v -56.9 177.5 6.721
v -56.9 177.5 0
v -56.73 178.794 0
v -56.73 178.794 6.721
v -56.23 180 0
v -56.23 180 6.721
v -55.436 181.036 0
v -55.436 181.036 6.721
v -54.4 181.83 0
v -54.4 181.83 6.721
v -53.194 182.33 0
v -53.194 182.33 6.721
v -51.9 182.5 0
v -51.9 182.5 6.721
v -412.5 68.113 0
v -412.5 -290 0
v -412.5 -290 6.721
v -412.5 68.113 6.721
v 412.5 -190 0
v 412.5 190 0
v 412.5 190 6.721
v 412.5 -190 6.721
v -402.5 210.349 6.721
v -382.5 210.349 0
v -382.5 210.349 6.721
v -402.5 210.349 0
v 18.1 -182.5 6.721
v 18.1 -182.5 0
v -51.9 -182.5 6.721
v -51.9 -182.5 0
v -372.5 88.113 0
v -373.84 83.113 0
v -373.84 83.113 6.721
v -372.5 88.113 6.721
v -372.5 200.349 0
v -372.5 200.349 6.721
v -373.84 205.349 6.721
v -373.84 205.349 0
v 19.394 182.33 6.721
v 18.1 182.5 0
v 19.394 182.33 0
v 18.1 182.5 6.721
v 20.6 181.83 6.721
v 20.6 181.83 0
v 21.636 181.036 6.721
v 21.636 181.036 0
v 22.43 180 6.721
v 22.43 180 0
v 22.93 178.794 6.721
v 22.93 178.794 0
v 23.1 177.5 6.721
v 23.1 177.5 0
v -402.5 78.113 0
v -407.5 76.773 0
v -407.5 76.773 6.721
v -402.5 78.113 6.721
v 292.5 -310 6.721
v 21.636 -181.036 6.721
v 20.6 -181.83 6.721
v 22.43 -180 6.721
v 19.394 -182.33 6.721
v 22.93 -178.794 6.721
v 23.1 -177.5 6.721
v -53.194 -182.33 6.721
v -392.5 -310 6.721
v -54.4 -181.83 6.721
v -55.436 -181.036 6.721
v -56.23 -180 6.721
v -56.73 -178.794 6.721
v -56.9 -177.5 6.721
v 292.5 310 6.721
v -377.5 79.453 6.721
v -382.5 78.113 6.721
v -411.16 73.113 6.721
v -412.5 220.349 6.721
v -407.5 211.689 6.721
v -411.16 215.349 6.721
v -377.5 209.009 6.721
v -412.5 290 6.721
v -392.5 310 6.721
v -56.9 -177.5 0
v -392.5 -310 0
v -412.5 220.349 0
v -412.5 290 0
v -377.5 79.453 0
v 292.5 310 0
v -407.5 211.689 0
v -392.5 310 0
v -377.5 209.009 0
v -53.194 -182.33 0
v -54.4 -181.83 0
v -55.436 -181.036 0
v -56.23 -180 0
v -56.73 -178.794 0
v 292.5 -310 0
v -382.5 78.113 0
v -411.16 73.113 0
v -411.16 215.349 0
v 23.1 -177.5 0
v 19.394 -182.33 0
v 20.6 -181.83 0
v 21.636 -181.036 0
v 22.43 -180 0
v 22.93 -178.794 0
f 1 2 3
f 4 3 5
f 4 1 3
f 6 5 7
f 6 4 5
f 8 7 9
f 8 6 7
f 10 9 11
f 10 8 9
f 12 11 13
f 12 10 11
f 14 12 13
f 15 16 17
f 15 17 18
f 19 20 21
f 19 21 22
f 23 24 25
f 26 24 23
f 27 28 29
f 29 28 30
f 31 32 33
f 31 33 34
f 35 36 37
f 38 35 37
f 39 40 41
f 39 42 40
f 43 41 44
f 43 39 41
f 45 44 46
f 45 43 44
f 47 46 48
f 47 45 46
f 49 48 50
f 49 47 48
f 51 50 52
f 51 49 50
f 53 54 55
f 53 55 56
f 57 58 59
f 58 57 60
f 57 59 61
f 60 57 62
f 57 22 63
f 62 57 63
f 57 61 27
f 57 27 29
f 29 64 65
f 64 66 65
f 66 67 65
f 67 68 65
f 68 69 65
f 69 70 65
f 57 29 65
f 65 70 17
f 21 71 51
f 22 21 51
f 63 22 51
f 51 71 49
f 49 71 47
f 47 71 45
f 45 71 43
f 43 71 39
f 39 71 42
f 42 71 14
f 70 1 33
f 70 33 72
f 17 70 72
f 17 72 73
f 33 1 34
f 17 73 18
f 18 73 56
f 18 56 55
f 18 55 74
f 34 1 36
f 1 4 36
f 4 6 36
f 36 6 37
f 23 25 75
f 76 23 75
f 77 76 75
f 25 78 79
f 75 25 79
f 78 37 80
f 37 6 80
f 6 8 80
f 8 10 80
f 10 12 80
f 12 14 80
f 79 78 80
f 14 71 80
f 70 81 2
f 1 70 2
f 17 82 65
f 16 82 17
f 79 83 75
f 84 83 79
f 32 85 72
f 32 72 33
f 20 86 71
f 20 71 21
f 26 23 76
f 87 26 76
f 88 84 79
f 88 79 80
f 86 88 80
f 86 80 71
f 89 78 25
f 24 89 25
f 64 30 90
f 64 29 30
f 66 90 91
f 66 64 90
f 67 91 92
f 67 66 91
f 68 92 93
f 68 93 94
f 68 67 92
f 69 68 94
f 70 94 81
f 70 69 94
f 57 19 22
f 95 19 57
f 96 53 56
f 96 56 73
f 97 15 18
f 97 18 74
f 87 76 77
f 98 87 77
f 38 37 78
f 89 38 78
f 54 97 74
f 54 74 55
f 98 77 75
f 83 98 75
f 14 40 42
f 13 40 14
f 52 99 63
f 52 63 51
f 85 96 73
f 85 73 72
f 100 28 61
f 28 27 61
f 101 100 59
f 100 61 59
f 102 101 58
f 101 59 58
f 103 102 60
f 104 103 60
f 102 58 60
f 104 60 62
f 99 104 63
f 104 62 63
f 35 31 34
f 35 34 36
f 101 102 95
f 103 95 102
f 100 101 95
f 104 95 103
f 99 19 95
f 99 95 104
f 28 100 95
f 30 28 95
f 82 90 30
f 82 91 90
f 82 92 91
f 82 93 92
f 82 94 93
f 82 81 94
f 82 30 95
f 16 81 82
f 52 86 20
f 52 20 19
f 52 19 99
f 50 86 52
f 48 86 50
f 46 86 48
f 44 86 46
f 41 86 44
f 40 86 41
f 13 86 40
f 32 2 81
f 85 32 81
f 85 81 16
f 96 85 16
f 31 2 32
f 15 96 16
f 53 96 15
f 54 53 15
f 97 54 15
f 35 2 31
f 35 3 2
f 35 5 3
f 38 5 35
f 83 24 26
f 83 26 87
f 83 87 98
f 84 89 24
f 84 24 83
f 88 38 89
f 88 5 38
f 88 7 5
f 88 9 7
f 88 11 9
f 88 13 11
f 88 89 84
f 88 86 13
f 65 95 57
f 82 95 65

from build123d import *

# Parameters (mm, degrees)
BOSS_EXTRUDE1_DEPTH = 6.720839839
SKETCH2_W           = 80
SKETCH2_H           = 365
CUT_EXTRUDE1_DEPTH  = 517.04400614
FILLET1_R           = 5


with BuildPart() as part:
    # Sketch1 → Boss-Extrude1 (new body)
    with BuildSketch(Plane(origin=(0, 0, 0), x_dir=(-1.0, 0, 1.2419204428734467e-09), z_dir=(-1.2419204428734467e-09, 1.2419185922687681e-09, -1.0))):
        Polygon((372.500002384, 200.349256396), (373.839735985, 205.349251628), (377.499997616, 209.009498358), (382.499992847, 210.34924686), (402.500003576, 210.34924686), (407.499998808, 211.688995361), (411.160260439, 215.349256992), (412.49999404, 220.349252224), (412.49999404, 289.999991655), (392.500013113, 310.000002384), (-292.499989271, 310.000002384), (-412.49999404, 189.999997616), (-412.49999404, -189.999997616), (-292.499989271, -310.000002384), (392.500013113, -310.000002384), (412.49999404, -289.999991655), (412.49999404, 68.113133311), (411.160260439, 73.113135993), (407.499998808, 76.773390174), (402.500003576, 78.113131225), (382.499992847, 78.113131225), (377.499997616, 79.452879727), (373.839735985, 83.113133907), (372.500002384, 88.11313659), align=None)
    extrude(amount=-BOSS_EXTRUDE1_DEPTH)

    # Sketch2 → Cut-Extrude1 (cut, through all)
    with BuildSketch(Plane(origin=(0, 0, 0), x_dir=(-1.0, 0, 1.2419204428734473e-09), z_dir=(-1.2419204428734473e-09, 1.241918592268768e-09, -1.0))):
        with Locations((16.89999404, 0)):
            Rectangle(SKETCH2_W, SKETCH2_H)
    extrude(amount=-CUT_EXTRUDE1_DEPTH, mode=Mode.SUBTRACT)

    # Fillet1
    fillet1_edges = [part.edges().sort_by_distance(p)[0] for p in [
        (23.100005965, -182.500000004, 3.360419664),
        (23.100005965, 182.499999996, 3.360420117),
        (-56.899994035, 182.499999996, 3.360420217),
        (-56.899994035, -182.500000004, 3.360419763),
    ]]
    fillet(fillet1_edges, radius=FILLET1_R)


solid = part.part
